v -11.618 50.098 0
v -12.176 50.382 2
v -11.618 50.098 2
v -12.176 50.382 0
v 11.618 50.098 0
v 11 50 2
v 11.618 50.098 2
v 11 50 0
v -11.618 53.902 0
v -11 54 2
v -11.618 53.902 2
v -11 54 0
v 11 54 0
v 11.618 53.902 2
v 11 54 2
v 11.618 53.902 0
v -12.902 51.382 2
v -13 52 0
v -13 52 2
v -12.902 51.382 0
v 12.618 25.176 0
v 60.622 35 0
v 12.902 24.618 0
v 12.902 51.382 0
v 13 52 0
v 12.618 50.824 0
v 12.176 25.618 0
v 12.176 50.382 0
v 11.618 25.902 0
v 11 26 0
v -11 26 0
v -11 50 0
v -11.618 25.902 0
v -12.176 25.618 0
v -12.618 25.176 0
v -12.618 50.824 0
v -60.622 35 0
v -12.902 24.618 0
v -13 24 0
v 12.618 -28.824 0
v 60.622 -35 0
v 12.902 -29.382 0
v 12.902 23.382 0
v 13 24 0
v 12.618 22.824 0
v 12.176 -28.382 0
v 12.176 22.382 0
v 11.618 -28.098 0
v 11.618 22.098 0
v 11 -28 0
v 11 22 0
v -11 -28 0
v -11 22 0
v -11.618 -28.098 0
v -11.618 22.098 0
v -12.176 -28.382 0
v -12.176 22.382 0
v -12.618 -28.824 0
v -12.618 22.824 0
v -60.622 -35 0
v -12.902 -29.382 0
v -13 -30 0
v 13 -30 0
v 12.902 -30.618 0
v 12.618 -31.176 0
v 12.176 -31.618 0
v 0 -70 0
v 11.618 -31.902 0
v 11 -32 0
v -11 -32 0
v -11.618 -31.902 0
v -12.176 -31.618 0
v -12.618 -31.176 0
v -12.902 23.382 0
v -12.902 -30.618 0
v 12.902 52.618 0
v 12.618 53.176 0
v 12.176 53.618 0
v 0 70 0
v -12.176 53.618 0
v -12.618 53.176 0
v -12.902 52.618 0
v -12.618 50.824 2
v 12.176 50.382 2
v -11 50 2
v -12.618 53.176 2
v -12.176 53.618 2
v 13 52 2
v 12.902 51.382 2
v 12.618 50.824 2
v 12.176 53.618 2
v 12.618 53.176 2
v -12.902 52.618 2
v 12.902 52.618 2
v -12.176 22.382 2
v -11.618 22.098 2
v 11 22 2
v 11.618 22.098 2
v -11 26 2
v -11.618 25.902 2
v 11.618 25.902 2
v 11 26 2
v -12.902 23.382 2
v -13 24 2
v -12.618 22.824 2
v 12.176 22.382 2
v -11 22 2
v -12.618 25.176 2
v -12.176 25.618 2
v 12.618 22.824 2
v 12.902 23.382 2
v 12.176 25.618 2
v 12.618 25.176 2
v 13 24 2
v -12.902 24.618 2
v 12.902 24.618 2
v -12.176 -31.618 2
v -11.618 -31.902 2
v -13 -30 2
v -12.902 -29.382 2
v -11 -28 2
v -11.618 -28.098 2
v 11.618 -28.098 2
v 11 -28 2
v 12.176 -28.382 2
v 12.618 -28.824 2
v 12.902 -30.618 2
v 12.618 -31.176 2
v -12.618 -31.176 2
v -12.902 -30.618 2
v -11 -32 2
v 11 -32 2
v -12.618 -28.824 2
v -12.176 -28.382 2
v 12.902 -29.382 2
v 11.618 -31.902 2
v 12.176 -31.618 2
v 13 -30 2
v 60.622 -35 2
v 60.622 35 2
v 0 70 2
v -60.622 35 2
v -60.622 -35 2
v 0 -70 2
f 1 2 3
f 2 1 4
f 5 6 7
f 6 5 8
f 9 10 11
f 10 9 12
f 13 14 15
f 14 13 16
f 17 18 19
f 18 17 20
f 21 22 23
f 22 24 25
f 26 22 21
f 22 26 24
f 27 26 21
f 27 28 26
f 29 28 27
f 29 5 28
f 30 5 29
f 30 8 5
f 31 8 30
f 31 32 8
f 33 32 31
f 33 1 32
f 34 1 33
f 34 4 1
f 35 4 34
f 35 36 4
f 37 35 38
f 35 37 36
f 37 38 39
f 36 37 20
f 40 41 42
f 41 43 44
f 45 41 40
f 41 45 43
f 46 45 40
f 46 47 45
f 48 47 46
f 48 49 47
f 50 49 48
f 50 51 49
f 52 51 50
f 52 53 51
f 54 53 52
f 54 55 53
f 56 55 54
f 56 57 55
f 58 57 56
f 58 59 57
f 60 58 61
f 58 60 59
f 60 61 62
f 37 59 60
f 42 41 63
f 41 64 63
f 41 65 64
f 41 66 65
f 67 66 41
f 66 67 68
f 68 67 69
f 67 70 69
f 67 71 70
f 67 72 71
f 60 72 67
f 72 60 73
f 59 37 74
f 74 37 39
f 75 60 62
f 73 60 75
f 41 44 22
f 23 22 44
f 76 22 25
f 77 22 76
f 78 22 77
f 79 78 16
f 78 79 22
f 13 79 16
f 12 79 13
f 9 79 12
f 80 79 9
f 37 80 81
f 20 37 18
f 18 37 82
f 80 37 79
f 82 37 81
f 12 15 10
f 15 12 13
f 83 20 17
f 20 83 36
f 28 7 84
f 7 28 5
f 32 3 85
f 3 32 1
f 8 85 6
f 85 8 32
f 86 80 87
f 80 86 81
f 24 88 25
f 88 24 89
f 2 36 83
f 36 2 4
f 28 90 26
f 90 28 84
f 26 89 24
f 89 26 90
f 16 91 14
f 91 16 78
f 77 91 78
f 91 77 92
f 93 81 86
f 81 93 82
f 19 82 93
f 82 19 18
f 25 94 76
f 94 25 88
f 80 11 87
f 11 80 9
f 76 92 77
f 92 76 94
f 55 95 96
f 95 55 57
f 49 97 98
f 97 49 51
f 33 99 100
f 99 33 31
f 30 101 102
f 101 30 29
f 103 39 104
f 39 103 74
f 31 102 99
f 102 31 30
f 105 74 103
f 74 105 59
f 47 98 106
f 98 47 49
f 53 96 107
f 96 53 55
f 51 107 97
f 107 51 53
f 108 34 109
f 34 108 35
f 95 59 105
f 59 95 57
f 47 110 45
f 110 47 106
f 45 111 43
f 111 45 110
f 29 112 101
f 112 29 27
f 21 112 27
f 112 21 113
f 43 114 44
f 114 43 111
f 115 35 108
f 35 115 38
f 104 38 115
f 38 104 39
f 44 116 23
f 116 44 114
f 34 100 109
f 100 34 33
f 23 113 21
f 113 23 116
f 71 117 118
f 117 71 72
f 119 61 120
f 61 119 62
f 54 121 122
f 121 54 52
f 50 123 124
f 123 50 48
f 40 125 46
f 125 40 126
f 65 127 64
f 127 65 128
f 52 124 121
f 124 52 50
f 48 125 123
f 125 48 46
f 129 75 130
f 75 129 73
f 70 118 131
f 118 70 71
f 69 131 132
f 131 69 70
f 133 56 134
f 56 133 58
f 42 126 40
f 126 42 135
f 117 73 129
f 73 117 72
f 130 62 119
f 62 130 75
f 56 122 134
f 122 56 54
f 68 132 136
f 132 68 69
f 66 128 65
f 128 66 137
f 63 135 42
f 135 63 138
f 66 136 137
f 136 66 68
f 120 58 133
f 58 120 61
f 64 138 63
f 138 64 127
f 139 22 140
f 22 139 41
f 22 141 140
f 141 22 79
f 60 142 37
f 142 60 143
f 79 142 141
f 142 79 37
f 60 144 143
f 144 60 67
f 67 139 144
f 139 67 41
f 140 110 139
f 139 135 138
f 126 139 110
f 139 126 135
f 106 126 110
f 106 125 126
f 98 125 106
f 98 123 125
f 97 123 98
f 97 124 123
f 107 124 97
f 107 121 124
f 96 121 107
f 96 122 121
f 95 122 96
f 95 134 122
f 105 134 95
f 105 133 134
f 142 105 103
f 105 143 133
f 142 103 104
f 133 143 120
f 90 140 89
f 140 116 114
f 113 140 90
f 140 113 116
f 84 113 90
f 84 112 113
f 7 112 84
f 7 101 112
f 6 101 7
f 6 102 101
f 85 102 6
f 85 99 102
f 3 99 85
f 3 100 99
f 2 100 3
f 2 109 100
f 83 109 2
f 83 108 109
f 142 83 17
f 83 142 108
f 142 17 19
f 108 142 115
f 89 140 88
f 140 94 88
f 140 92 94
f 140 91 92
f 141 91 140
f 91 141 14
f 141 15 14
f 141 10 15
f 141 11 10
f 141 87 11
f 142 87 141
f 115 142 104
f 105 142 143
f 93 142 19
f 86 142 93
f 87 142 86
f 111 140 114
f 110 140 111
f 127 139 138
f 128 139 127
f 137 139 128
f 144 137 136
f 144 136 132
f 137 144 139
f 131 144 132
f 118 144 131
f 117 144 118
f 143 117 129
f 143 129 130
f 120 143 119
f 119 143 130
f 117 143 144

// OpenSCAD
// file: medal-dummy.scad
medalRadius = 90/2;
medalThickness = 2;
medalHangWidth = 26;
medalHangHeight = 15;

module medalDummy() {
  color(c=[0.3,1,0.3]) {
    cylinder(h=2, r=medalRadius);
    translate(v=[-medalHangWidth/2, 0, 0]) 
    cube([medalHangWidth,medalHangHeight + medalRadius,medalThickness]);
  }
}

medalDummy();
// main file
use <medal-dummy.scad>

baseThickness = 2;
baseRadius = 70;


module medal () {
    translate(v=[0,-5,baseThickness])
    medalDummy();
}

module flatBase () {
    rotate(a=[0,0,90]) 
    cylinder(h=baseThickness, r=baseRadius, $fn=6);
}

module ribbonCutout () {
    color(c="red")
    hull() {
        translate(v=[-11,0,0]) 
        cylinder(r=2, h=baseThickness+1, $fn=20);
        translate(v=[11,0,0]) 
        cylinder(r=2, h=baseThickness+1, $fn=20);
    }
}

module fullRibbonHoles() {
    translate(v=[0,52,0]) 
    ribbonCutout();
    translate(v=[0,24,0]) 
    ribbonCutout();
    translate(v=[0,-30,0]) 
    ribbonCutout();
}

module roundCutout (height, radius, delta) {
    difference() {
        cylinder(h=height, r1=radius, r2=radius+delta);
        cylinder(h=height, r1=radius, r2=radius-delta);
    }
}

module base() {
    difference() {
        flatBase();
        fullRibbonHoles();
        // translate(v=[0,0,baseThickness-1]) 
        // roundCutout(height=1, radius=baseRadius-20, delta=1);
    }
    
}

// medal();

base();
